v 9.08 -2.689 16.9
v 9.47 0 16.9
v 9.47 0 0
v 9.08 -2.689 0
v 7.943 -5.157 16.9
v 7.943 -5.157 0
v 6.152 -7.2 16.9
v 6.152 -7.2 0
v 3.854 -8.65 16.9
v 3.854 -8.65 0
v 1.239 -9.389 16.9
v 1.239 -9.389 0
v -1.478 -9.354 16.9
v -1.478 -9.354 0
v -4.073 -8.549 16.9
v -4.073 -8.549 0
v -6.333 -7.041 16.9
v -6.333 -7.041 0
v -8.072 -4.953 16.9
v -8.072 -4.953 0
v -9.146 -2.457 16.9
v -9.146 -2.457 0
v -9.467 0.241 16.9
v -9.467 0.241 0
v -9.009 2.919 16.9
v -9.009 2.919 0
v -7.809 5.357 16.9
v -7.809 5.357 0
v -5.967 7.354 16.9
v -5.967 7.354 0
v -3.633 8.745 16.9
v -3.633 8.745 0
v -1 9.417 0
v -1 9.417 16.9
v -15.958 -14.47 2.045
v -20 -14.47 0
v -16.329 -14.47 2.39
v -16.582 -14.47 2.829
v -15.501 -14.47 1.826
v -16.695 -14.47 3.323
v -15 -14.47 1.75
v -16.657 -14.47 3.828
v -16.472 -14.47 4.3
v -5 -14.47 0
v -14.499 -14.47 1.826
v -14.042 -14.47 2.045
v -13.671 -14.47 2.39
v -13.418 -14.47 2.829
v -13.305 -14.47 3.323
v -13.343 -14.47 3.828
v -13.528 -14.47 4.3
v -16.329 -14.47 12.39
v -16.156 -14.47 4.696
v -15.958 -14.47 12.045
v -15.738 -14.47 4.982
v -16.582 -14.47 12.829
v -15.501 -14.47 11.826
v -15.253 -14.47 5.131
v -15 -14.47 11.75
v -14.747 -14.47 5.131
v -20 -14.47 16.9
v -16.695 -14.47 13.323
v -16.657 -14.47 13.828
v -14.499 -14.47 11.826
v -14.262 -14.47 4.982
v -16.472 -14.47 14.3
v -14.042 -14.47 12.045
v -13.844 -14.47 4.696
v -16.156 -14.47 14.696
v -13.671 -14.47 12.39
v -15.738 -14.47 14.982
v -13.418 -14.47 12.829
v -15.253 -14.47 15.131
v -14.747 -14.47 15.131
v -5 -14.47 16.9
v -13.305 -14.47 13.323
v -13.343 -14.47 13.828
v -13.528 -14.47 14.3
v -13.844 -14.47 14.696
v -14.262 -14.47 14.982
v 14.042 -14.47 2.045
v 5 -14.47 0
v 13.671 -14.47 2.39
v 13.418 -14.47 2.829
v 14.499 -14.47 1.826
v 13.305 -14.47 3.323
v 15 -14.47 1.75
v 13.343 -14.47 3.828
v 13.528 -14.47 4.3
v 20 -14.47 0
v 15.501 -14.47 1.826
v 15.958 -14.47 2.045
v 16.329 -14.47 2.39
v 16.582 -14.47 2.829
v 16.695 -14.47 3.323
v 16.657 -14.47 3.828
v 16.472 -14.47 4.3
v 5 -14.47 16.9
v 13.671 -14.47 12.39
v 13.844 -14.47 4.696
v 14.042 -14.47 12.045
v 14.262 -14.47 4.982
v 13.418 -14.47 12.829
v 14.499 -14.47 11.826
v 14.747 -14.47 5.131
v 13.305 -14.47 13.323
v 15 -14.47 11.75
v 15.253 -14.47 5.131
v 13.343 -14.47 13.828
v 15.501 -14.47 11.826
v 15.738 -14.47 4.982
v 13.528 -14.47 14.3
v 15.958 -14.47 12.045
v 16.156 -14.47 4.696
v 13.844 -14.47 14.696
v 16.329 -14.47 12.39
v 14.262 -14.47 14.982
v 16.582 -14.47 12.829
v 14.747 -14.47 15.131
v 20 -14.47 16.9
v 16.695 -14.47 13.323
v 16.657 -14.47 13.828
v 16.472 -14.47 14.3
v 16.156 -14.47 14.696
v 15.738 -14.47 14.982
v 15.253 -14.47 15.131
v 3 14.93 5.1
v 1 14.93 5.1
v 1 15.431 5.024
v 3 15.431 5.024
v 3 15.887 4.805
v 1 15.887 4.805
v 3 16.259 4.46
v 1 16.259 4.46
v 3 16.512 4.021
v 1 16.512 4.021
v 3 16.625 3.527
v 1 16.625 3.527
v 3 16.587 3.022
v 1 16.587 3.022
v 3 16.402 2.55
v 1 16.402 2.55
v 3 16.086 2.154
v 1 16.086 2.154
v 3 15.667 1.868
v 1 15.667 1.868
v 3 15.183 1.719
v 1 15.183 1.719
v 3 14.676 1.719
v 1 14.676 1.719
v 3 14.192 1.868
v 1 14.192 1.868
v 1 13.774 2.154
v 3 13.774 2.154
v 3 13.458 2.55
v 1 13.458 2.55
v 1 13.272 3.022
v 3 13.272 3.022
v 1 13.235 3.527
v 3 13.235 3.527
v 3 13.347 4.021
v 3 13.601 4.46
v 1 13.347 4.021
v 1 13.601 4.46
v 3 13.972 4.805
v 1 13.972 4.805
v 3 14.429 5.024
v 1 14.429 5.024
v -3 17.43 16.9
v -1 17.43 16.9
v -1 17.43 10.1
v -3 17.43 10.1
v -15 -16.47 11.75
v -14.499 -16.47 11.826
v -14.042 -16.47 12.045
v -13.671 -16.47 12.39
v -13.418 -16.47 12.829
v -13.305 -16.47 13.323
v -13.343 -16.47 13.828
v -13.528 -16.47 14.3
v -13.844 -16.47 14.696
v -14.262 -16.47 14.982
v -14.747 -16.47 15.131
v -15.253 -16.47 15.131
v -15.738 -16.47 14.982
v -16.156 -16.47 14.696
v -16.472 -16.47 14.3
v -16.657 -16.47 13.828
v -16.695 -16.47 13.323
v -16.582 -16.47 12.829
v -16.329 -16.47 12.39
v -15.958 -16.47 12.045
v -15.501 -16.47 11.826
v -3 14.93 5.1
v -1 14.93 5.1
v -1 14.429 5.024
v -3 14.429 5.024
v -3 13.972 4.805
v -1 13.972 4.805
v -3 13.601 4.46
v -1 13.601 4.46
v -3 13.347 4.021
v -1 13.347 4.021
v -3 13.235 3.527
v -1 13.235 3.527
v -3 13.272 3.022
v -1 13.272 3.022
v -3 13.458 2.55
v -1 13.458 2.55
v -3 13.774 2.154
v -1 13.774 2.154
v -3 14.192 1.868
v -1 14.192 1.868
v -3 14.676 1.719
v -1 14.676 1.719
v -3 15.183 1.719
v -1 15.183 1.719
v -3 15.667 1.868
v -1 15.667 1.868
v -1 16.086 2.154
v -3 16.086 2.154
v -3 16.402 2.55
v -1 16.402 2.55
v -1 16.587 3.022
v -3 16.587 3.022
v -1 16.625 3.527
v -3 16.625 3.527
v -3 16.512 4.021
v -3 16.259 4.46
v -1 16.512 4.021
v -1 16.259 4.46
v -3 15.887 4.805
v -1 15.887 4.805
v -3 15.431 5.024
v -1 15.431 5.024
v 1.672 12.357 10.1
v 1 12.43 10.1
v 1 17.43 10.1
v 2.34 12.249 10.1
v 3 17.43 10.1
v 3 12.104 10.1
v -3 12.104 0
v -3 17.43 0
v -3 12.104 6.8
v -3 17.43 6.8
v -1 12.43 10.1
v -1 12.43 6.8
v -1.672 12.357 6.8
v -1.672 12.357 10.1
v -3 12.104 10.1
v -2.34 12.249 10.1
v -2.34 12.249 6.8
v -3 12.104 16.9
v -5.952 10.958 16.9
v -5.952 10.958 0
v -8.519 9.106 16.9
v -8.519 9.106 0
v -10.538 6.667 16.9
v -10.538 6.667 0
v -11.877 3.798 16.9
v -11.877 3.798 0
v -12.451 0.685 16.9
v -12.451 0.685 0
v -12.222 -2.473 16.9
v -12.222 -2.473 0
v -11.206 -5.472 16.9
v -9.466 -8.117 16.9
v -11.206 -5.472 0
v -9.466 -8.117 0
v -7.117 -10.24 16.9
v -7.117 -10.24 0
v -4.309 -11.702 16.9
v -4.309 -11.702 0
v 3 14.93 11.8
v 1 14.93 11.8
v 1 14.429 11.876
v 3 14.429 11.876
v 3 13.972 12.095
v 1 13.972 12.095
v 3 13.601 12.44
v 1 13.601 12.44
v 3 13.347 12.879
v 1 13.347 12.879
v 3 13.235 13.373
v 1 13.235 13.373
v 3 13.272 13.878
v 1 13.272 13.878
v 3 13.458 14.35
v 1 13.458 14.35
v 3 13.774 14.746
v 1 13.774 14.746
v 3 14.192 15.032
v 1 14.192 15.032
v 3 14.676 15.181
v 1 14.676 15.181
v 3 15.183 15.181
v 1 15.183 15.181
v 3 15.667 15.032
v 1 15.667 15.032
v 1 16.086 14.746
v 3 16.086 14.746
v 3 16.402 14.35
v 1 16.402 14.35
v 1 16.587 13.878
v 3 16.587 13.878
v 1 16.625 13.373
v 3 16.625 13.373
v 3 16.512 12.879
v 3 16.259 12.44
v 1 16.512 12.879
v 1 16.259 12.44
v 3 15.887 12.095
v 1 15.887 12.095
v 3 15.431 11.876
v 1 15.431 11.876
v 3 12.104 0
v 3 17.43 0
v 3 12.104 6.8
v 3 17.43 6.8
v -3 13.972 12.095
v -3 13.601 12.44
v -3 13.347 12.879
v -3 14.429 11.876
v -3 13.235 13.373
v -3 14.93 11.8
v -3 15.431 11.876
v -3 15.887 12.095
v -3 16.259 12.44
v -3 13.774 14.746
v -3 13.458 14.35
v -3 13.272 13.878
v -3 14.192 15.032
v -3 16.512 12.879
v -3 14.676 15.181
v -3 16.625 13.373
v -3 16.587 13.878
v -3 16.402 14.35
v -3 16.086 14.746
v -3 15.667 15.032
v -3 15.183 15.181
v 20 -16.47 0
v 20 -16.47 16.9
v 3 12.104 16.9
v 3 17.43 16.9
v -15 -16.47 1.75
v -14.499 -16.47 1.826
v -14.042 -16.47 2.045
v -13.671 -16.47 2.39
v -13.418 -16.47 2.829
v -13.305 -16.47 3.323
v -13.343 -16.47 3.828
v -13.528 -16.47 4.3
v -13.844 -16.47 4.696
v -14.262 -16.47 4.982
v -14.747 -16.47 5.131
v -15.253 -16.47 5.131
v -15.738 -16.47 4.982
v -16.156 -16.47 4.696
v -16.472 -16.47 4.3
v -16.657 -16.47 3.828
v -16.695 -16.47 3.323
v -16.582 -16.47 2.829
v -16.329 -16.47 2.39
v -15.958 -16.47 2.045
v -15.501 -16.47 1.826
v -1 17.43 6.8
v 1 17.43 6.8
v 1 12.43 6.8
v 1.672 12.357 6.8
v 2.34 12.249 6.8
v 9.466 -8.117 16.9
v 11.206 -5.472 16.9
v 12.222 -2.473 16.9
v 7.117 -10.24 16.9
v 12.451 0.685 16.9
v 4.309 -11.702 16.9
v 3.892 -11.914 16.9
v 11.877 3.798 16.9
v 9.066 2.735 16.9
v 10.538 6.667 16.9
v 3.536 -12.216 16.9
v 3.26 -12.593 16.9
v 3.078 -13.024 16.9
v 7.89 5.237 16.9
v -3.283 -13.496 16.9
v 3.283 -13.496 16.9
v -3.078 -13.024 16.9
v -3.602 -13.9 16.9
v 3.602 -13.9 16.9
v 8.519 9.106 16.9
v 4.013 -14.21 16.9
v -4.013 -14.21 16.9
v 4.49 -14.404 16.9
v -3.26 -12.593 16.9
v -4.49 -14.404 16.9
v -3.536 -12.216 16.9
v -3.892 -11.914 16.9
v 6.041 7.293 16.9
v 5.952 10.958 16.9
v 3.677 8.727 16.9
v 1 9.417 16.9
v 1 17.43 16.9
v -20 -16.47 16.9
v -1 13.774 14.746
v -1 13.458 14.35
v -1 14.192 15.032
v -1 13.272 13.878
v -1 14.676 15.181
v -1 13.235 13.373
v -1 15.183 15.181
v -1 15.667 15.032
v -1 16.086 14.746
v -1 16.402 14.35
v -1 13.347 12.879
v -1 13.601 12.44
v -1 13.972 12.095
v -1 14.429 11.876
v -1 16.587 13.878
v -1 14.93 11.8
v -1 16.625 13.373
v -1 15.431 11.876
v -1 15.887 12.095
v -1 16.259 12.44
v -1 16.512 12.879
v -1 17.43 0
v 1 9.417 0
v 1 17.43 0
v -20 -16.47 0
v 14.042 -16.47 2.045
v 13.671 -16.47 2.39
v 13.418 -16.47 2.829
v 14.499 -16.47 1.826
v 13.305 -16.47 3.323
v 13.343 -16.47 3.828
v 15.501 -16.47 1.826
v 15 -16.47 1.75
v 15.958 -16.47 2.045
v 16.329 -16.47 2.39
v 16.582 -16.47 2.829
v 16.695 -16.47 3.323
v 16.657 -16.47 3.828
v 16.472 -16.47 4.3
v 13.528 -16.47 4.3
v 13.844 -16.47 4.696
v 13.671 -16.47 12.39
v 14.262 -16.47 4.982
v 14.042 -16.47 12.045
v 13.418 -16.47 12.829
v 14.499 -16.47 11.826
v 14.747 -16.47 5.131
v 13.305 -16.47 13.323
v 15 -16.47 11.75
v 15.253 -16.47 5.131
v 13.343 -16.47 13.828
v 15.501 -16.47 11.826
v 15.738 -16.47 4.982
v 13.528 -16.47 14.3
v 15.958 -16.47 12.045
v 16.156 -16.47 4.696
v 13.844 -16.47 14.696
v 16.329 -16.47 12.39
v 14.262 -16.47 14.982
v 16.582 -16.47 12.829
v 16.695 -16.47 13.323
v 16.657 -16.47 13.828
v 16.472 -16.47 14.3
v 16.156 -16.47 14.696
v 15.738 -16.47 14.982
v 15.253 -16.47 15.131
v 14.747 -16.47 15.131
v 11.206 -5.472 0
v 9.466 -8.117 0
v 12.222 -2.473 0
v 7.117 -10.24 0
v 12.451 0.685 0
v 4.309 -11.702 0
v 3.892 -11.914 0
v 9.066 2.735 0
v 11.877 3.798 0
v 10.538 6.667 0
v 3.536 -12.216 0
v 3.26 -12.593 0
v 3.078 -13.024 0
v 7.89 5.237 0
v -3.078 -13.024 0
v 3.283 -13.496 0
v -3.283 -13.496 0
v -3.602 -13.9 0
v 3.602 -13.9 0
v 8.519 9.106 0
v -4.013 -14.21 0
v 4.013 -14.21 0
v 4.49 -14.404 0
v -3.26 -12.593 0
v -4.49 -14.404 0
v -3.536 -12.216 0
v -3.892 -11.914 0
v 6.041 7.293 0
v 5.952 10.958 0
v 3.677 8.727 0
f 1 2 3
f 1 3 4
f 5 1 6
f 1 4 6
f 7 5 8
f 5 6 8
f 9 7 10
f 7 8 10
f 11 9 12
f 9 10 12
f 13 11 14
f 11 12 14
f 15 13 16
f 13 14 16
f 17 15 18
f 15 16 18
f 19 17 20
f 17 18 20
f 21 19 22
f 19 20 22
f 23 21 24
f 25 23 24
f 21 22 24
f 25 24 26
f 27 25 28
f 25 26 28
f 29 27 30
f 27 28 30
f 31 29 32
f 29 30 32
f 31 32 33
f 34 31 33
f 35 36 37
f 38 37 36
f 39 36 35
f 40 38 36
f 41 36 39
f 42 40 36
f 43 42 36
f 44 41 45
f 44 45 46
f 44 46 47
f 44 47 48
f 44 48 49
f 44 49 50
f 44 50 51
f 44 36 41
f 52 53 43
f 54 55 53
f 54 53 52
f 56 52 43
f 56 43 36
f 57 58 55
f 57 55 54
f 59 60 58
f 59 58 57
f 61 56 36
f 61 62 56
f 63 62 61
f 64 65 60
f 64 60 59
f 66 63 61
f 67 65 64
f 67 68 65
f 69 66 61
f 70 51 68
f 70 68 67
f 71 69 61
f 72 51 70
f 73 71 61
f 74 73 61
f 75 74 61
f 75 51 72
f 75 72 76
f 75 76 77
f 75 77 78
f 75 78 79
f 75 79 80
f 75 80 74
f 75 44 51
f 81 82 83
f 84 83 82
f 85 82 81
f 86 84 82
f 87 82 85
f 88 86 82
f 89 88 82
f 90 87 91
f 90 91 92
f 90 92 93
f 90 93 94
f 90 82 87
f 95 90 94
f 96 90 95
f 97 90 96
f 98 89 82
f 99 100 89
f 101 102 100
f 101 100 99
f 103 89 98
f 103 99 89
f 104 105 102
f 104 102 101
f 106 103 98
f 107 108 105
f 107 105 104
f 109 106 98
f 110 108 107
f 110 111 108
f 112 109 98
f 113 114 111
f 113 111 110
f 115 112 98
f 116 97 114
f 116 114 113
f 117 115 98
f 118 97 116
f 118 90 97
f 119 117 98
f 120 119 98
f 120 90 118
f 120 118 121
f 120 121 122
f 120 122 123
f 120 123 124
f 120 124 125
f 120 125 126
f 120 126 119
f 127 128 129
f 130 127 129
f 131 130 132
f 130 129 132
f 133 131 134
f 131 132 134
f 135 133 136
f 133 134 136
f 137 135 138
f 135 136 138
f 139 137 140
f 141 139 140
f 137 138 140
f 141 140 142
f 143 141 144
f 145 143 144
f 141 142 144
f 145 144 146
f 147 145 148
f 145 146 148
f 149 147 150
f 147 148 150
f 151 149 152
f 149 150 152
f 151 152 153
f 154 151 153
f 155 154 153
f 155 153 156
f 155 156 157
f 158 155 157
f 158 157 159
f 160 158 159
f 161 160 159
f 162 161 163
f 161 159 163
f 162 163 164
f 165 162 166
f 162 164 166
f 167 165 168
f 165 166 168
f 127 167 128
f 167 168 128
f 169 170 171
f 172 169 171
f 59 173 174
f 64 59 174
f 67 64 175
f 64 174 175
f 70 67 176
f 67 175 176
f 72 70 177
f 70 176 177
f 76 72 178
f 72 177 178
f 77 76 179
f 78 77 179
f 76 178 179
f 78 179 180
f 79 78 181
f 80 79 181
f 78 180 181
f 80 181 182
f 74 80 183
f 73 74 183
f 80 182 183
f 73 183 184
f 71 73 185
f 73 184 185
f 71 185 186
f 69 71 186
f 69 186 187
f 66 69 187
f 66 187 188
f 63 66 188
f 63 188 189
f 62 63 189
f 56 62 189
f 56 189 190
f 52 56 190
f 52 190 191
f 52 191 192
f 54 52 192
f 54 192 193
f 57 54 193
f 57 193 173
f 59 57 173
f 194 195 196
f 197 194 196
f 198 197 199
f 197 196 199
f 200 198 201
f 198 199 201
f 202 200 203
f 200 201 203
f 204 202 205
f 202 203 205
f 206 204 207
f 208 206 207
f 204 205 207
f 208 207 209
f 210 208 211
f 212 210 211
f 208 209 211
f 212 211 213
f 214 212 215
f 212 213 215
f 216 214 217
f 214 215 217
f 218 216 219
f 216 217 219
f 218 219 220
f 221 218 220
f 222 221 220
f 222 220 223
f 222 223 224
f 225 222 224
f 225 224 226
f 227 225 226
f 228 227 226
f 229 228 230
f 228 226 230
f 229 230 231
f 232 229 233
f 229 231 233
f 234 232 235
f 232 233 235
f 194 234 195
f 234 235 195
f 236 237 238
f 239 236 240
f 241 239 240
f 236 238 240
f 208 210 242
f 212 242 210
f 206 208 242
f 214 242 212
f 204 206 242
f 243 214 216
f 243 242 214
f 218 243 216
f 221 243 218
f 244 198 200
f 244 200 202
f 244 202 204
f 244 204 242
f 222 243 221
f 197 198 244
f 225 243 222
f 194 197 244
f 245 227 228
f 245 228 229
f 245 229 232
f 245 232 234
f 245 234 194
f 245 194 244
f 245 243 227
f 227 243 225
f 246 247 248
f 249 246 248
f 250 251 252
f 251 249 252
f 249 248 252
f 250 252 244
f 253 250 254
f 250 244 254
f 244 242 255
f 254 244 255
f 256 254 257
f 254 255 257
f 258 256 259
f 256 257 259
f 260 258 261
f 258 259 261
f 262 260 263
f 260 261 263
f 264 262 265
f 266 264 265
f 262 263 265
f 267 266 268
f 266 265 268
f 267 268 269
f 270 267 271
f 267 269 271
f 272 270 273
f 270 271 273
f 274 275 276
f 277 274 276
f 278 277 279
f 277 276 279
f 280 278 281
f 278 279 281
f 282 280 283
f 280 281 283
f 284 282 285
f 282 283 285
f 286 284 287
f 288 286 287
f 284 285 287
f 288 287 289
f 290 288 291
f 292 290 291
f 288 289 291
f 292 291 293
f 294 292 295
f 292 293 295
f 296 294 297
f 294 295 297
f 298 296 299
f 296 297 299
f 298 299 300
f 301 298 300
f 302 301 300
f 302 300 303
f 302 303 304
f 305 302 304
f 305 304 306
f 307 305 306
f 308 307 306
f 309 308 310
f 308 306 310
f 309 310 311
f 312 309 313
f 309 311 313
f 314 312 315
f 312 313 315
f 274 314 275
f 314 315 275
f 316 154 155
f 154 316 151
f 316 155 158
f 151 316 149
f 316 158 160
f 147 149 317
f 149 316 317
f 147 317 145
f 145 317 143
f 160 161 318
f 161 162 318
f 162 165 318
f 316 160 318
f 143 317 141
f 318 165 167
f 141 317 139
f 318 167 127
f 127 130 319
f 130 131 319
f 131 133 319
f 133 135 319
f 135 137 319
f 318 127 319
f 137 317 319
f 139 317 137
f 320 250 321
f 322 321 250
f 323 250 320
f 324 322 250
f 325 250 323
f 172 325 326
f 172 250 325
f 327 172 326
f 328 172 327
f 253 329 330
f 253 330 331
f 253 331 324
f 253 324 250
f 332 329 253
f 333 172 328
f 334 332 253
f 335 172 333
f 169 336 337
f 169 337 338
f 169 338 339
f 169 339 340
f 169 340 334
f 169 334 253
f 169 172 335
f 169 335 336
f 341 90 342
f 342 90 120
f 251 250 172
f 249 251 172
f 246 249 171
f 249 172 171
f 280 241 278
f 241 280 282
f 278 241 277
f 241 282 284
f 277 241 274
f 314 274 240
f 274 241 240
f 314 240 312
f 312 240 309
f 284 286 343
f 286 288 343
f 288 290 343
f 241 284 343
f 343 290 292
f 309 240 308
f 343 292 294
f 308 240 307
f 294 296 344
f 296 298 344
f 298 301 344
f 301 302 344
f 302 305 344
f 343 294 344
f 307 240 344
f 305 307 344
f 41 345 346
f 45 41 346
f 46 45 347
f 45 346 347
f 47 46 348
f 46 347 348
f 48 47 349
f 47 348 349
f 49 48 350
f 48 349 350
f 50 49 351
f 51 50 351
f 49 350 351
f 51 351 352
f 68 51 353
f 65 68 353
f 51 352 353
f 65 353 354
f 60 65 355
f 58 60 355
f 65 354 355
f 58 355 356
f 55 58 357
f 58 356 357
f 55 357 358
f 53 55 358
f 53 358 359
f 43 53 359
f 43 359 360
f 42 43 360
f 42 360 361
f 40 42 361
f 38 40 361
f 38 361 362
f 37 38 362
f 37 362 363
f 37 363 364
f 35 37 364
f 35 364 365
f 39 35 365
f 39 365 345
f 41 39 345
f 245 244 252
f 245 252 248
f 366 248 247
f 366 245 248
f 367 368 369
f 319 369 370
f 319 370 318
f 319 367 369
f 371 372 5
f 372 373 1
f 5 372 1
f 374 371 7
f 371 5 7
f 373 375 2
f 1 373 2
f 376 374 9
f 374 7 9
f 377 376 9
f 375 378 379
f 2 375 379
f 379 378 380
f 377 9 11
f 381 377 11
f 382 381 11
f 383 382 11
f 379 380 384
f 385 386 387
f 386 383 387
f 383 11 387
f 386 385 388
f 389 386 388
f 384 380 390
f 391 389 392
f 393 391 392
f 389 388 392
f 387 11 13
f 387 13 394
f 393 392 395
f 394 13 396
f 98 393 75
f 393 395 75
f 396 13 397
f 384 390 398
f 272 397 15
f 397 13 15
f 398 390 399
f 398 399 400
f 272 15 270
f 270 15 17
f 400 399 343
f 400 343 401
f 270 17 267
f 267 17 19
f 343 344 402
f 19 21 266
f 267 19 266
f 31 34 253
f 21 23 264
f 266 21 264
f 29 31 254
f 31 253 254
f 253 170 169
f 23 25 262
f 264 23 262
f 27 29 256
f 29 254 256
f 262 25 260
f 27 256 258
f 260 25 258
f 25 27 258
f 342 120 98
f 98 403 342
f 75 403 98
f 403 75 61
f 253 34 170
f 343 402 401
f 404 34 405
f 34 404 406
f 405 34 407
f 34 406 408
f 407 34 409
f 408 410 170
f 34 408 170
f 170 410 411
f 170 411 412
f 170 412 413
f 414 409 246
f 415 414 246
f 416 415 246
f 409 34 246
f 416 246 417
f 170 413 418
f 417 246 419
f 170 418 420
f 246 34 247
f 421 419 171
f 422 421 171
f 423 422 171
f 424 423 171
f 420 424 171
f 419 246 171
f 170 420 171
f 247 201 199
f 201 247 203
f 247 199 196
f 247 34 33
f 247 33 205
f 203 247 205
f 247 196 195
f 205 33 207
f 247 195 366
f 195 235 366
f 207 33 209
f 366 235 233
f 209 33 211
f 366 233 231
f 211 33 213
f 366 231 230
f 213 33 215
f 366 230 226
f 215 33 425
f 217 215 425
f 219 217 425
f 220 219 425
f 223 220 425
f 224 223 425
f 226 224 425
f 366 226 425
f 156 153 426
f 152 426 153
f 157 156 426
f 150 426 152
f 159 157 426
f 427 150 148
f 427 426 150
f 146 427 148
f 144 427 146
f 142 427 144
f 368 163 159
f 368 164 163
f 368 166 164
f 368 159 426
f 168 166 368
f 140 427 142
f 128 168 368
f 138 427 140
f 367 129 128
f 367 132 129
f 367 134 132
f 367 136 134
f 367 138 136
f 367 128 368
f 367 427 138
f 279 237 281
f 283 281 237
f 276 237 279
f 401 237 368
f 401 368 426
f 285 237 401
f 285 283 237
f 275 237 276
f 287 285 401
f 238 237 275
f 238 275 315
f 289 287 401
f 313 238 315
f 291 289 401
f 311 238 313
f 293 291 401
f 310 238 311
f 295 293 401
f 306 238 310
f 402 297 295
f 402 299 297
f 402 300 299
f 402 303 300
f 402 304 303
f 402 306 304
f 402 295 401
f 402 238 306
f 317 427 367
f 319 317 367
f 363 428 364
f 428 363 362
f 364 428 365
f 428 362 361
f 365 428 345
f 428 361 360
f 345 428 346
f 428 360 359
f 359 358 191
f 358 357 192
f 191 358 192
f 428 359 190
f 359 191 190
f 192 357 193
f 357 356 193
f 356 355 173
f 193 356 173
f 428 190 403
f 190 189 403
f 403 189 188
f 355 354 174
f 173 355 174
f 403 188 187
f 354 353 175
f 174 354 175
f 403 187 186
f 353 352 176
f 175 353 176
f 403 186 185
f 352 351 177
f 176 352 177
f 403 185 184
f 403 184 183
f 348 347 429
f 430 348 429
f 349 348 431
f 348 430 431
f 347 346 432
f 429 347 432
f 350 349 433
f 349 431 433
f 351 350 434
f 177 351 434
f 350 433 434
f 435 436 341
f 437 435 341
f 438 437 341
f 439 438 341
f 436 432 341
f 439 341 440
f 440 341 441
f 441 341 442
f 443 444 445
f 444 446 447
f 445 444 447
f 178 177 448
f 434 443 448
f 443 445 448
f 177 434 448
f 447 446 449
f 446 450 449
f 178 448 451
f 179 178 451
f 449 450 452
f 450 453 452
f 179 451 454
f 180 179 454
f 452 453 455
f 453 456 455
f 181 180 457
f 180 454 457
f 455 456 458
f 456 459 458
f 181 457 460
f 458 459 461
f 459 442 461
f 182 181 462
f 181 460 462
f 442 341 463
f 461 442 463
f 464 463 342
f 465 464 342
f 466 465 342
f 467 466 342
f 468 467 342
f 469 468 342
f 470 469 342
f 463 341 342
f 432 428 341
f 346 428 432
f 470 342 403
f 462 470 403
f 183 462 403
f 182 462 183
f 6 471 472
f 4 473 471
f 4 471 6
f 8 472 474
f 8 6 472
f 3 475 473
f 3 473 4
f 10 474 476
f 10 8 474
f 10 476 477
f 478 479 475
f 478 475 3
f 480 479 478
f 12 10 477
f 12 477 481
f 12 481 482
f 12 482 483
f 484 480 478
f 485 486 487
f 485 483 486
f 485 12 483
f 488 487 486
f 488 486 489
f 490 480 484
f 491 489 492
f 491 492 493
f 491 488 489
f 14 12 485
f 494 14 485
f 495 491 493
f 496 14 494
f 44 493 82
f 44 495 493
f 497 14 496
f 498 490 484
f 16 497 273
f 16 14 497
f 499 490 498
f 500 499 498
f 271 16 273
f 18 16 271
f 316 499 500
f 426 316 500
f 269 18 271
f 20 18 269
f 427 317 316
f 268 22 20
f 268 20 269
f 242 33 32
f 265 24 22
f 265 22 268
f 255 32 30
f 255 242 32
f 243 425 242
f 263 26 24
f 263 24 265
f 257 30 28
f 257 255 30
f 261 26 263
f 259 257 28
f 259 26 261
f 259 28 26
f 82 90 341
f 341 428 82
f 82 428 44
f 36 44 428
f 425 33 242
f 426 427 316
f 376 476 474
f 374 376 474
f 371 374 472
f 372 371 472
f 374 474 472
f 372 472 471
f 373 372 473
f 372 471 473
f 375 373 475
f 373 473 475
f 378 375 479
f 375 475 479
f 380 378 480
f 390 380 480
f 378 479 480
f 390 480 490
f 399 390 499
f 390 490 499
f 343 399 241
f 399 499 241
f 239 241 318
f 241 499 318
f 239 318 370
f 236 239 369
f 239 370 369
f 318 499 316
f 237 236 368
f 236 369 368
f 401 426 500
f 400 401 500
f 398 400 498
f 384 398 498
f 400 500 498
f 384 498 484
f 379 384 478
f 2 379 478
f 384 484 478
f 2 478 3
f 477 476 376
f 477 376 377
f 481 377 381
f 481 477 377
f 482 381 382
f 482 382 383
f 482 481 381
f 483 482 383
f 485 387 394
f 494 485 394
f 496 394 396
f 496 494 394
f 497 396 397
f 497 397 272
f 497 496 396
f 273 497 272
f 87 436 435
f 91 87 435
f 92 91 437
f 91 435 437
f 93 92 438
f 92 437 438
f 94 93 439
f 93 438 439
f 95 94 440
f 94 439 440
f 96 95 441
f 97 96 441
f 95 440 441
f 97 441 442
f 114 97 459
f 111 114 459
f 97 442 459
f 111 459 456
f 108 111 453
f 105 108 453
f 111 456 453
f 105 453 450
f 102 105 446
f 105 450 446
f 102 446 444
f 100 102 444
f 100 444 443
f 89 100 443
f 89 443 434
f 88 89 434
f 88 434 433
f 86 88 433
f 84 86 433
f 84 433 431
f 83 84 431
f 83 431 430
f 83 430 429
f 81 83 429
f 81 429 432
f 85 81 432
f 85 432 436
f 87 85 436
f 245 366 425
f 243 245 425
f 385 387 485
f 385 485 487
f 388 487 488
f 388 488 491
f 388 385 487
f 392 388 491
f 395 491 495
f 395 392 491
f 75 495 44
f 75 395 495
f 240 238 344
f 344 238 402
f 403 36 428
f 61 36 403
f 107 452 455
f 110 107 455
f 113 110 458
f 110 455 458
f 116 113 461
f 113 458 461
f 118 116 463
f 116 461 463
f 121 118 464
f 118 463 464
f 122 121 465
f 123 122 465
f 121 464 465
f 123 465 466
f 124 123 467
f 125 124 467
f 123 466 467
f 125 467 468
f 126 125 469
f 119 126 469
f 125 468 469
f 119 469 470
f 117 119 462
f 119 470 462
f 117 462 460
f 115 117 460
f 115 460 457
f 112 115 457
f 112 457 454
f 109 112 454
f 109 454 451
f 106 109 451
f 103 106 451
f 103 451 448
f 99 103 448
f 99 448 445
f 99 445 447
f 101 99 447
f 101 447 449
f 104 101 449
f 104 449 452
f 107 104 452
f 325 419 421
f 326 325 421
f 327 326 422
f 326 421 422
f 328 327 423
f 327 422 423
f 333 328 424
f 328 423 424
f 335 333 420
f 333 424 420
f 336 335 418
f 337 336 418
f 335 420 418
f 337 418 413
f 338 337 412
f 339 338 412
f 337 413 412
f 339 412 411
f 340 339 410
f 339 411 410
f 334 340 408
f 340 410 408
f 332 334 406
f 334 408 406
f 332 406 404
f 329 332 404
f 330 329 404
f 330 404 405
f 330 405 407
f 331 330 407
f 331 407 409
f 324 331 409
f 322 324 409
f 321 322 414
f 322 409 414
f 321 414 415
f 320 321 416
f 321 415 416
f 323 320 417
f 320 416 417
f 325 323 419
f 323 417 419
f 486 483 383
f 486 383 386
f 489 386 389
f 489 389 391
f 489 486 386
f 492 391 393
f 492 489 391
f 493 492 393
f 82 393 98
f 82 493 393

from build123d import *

# Parameters (mm, degrees)
BOSS_EXTRUDE1_DEPTH      = 16.9
SKETCH2_W                = 6.8
SKETCH2_H                = 5
SKETCH2_R                = 1.7
BOSS_EXTRUDE2_DEPTH      = 2
BOSS_EXTRUDE2_2_DEPTH    = 2
BOSS_EXTRUDE3_REACH      = 37.726
BOSS_EXTRUDE3_END_RADIUS = 12.47
SKETCH5_W                = 2
SKETCH5_H                = 6.8
SKETCH7_W                = 6.8
SKETCH7_H                = 5
SKETCH7_R                = 1.7
BOSS_EXTRUDE4_DEPTH      = 2
BOSS_EXTRUDE4_2_DEPTH    = 2
BOSS_EXTRUDE5_REACH      = 37.726
BOSS_EXTRUDE5_END_RADIUS = 12.47
SKETCH8_W                = 2
SKETCH8_H                = 6.8
BOSS_EXTRUDE7_DEPTH      = 17
BOSS_EXTRUDE7_DEPTH_BACK = 23
SKETCH9_W                = 16.9
SKETCH9_H                = 2
CUT_EXTRUDE1_REACH       = 44.835
SKETCH10_R               = 1.7
FILLET1_R                = 2


with BuildPart() as part:
    # Sketch1 → Boss-Extrude1 (new body)
    with BuildSketch(Plane.XY):
        with BuildLine():
            ThreePointArc((9.47, 0), (-6.332886388, -7.040983596), (-1, 9.417053679))
            Line((-1, 9.417053679), (-1, 12.429839098))
            ThreePointArc((-1, 12.429839098), (-12.428769746, 1.01320413), (-3, -12.103755616))
            Line((-3, -12.103755616), (-3, -16.47))
            Line((-3, -16.47), (3, -16.47))
            Line((3, -16.47), (3, -12.103755616))
            ThreePointArc((3, -12.103755616), (12.428769746, 1.01320413), (1, 12.429839098))
            Line((1, 12.429839098), (1, 9.417053679))
            ThreePointArc((1, 9.417053679), (7.040983596, 6.332886388), (9.47, 0))
        make_face()
    extrude(amount=BOSS_EXTRUDE1_DEPTH)



with BuildPart() as body_2:
    # Sketch2 → Boss-Extrude2 (new body)
    with BuildSketch(Plane(origin=(-1, 0, 0), x_dir=(0, 0, -1), z_dir=(1, 0, 0))):
        with Locations((-13.5, 14.929839098)):
            Rectangle(SKETCH2_W, SKETCH2_H)
        with Locations((-13.5, 14.929839098)):
            Circle(SKETCH2_R, mode=Mode.SUBTRACT)
    extrude(amount=-BOSS_EXTRUDE2_DEPTH)


with BuildPart() as body_3:
    # Sketch2 → Boss-Extrude2 2 (new body)
    with BuildSketch(Plane(origin=(-1, 0, 0), x_dir=(0, 0, -1), z_dir=(1, 0, 0))):
        with Locations((-3.4, 14.929839098)):
            Rectangle(SKETCH2_W, SKETCH2_H)
        with Locations(Location((-3.4, 14.929839098, 0), (0, 0, 180))):
            Circle(SKETCH2_R, mode=Mode.SUBTRACT)
    extrude(amount=-BOSS_EXTRUDE2_2_DEPTH)


with BuildPart() as part_1:
    add(part.part)

    add(body_2.part)  # Boss-Extrude3 merges body 2

    add(body_3.part)  # Boss-Extrude3 merges body 3
    # Boss-Extrude3: up to this cylinder (the profile starts outside it)
    boss_extrude3_end = Plane(origin=(0, 0, 8.45), z_dir=(0, 0, -1)) * Cylinder(BOSS_EXTRUDE3_END_RADIUS, 111.492, mode=Mode.PRIVATE)
    # Sketch5 → Boss-Extrude3 (add, up to the surface)
    with BuildSketch(Plane.XZ.offset(-12.429839098), mode=Mode.PRIVATE) as boss_extrude3_sk1:
        with Locations((-2, 3.4)):
            Rectangle(SKETCH5_W, SKETCH5_H)
    boss_extrude3_tool1 = extrude(boss_extrude3_sk1.sketch, amount=BOSS_EXTRUDE3_REACH, mode=Mode.PRIVATE) - boss_extrude3_end
    add(boss_extrude3_tool1.solids().sort_by_distance((-2, 12.429839, 3.4))[0])
    # Sketch5 → Boss-Extrude3 (add, up to the surface)
    with BuildSketch(Plane.XZ.offset(-12.429839098), mode=Mode.PRIVATE) as boss_extrude3_sk2:
        with Locations((-2, 13.5)):
            Rectangle(SKETCH5_W, SKETCH5_H)
    boss_extrude3_tool2 = extrude(boss_extrude3_sk2.sketch, amount=BOSS_EXTRUDE3_REACH, mode=Mode.PRIVATE) - boss_extrude3_end
    add(boss_extrude3_tool2.solids().sort_by_distance((-2, 12.429839, 13.5))[0])



with BuildPart() as body_2_2:
    # Sketch7 → Boss-Extrude4 (new body)
    with BuildSketch(Plane.ZY.offset(-1)):
        with Locations((3.4, 14.929839098)):
            Rectangle(SKETCH7_W, SKETCH7_H)
        with Locations((3.4, 14.929839098)):
            Circle(SKETCH7_R, mode=Mode.SUBTRACT)
    extrude(amount=-BOSS_EXTRUDE4_DEPTH)


with BuildPart() as body_3_2:
    # Sketch7 → Boss-Extrude4 2 (new body)
    with BuildSketch(Plane.ZY.offset(-1)):
        with Locations((13.5, 14.929839098)):
            Rectangle(SKETCH7_W, SKETCH7_H)
        with Locations(Location((13.5, 14.929839098, 0), (0, 0, 180))):
            Circle(SKETCH7_R, mode=Mode.SUBTRACT)
    extrude(amount=-BOSS_EXTRUDE4_2_DEPTH)


with BuildPart() as part_2:
    add(part_1.part)

    add(body_2_2.part)  # Boss-Extrude5 merges body 2 2

    add(body_3_2.part)  # Boss-Extrude5 merges body 3 2
    # Boss-Extrude5: up to this cylinder (the profile starts outside it)
    boss_extrude5_end = Plane(origin=(0, 0, 8.45), z_dir=(0, 0, -1)) * Cylinder(BOSS_EXTRUDE5_END_RADIUS, 111.492, mode=Mode.PRIVATE)
    # Sketch8 → Boss-Extrude5 (add, up to the surface)
    with BuildSketch(Plane.XZ.offset(-12.429839098), mode=Mode.PRIVATE) as boss_extrude5_sk1:
        with Locations((2, 3.4)):
            Rectangle(SKETCH8_W, SKETCH8_H)
    boss_extrude5_tool1 = extrude(boss_extrude5_sk1.sketch, amount=BOSS_EXTRUDE5_REACH, mode=Mode.PRIVATE) - boss_extrude5_end
    add(boss_extrude5_tool1.solids().sort_by_distance((2, 12.429839, 3.4))[0])
    # Sketch8 → Boss-Extrude5 (add, up to the surface)
    with BuildSketch(Plane.XZ.offset(-12.429839098), mode=Mode.PRIVATE) as boss_extrude5_sk2:
        with Locations((2, 13.5)):
            Rectangle(SKETCH8_W, SKETCH8_H)
    boss_extrude5_tool2 = extrude(boss_extrude5_sk2.sketch, amount=BOSS_EXTRUDE5_REACH, mode=Mode.PRIVATE) - boss_extrude5_end
    add(boss_extrude5_tool2.solids().sort_by_distance((2, 12.429839, 13.5))[0])

    # Sketch9 → Boss-Extrude7 (add, two sides: drawn at the far end of the back side and taken through both)
    with BuildSketch(Plane.ZY.offset(3).offset(-BOSS_EXTRUDE7_DEPTH_BACK)):
        with Locations((8.45, -15.47)):
            Rectangle(SKETCH9_W, SKETCH9_H)
    extrude(amount=BOSS_EXTRUDE7_DEPTH + BOSS_EXTRUDE7_DEPTH_BACK)

    # Sketch10 → Cut-Extrude1 (cut, up to next)
    with BuildSketch(Plane.XZ.offset(16.47), mode=Mode.PRIVATE) as cut_extrude1_sk1:
        with Locations(Location((-15, 3.45, 0), (0, 0, 270))):
            Circle(SKETCH10_R)
    cut_extrude1_tool1 = extrude(cut_extrude1_sk1.sketch, amount=-CUT_EXTRUDE1_REACH, mode=Mode.PRIVATE) & part_2.part
    # Sketch10 → Cut-Extrude1 (cut, up to next)
    with BuildSketch(Plane.XZ.offset(16.47), mode=Mode.PRIVATE) as cut_extrude1_sk2:
        with Locations(Location((-15, 13.45, 0), (0, 0, 270))):
            Circle(SKETCH10_R)
    cut_extrude1_tool2 = extrude(cut_extrude1_sk2.sketch, amount=-CUT_EXTRUDE1_REACH, mode=Mode.PRIVATE) & part_2.part
    # Sketch10 → Cut-Extrude1 (cut, up to next)
    with BuildSketch(Plane.XZ.offset(16.47), mode=Mode.PRIVATE) as cut_extrude1_sk3:
        with Locations(Location((15, 3.45, 0), (0, 0, 270))):
            Circle(SKETCH10_R)
    cut_extrude1_tool3 = extrude(cut_extrude1_sk3.sketch, amount=-CUT_EXTRUDE1_REACH, mode=Mode.PRIVATE) & part_2.part
    # Sketch10 → Cut-Extrude1 (cut, up to next)
    with BuildSketch(Plane.XZ.offset(16.47), mode=Mode.PRIVATE) as cut_extrude1_sk4:
        with Locations(Location((15, 13.45, 0), (0, 0, 270))):
            Circle(SKETCH10_R)
    cut_extrude1_tool4 = extrude(cut_extrude1_sk4.sketch, amount=-CUT_EXTRUDE1_REACH, mode=Mode.PRIVATE) & part_2.part
    add(cut_extrude1_tool1.solids().sort_by_distance((-15, -16.47, 3.45))[0], mode=Mode.SUBTRACT)
    add(cut_extrude1_tool2.solids().sort_by_distance((-15, -16.47, 13.45))[0], mode=Mode.SUBTRACT)
    add(cut_extrude1_tool3.solids().sort_by_distance((15, -16.47, 3.45))[0], mode=Mode.SUBTRACT)
    add(cut_extrude1_tool4.solids().sort_by_distance((15, -16.47, 13.45))[0], mode=Mode.SUBTRACT)

    # Fillet1
    # the kernel refuses this fillet: 2 mm, written as the material it adds along each edge
    with BuildSketch(Plane(origin=(-3, -12.103755616, 0), x_dir=(-0.9559582766785055, 0.2935025949627393, 0), z_dir=(0, 0, 1))) as fillet1_piece_1:
        with BuildLine():
            CenterArc((1.479018642, 1.996983664), FILLET1_R, 197.067768115, 69.785084401)
            Line((-0.432897911, 1.409978474), (0, 0))
            ThreePointArc((0, 0), (0.684608852, 0.018806856), (1.369217704, 0))
        make_face()
    extrude(amount=16.9)
    with BuildSketch(Plane(origin=(-3, -14.47, 16.9), x_dir=(0, 1, 0), z_dir=(0, 0, -1))) as fillet1_piece_2:
        with BuildLine():
            CenterArc((FILLET1_R, -FILLET1_R), FILLET1_R, 90, 90)
            Line((0, -FILLET1_R), (0, 0))
            Line((0, 0), (FILLET1_R, 0))
        make_face()
    extrude(amount=16.9)
    with BuildSketch(Plane(origin=(3, -12.103755616, 0), x_dir=(0.9559582766785055, 0.2935025949627393, 0), z_dir=(0, 0, 1))) as fillet1_piece_3:
        with BuildLine():
            CenterArc((1.479018642, -1.996983664), FILLET1_R, 93.147147485, 69.785084401)
            Line((-0.432897911, -1.409978474), (0, 0))
            ThreePointArc((0, 0), (0.684608852, -0.018806856), (1.369217704, 0))
        make_face()
    extrude(amount=16.9)
    with BuildSketch(Plane(origin=(3, -14.47, 0), x_dir=(1, 0, 0), z_dir=(0, 0, 1))) as fillet1_piece_4:
        with BuildLine():
            CenterArc((FILLET1_R, FILLET1_R), FILLET1_R, 180, 90)
            Line((0, FILLET1_R), (0, 0))
            Line((0, 0), (FILLET1_R, 0))
        make_face()
    extrude(amount=16.9)


solid = part_2.part
